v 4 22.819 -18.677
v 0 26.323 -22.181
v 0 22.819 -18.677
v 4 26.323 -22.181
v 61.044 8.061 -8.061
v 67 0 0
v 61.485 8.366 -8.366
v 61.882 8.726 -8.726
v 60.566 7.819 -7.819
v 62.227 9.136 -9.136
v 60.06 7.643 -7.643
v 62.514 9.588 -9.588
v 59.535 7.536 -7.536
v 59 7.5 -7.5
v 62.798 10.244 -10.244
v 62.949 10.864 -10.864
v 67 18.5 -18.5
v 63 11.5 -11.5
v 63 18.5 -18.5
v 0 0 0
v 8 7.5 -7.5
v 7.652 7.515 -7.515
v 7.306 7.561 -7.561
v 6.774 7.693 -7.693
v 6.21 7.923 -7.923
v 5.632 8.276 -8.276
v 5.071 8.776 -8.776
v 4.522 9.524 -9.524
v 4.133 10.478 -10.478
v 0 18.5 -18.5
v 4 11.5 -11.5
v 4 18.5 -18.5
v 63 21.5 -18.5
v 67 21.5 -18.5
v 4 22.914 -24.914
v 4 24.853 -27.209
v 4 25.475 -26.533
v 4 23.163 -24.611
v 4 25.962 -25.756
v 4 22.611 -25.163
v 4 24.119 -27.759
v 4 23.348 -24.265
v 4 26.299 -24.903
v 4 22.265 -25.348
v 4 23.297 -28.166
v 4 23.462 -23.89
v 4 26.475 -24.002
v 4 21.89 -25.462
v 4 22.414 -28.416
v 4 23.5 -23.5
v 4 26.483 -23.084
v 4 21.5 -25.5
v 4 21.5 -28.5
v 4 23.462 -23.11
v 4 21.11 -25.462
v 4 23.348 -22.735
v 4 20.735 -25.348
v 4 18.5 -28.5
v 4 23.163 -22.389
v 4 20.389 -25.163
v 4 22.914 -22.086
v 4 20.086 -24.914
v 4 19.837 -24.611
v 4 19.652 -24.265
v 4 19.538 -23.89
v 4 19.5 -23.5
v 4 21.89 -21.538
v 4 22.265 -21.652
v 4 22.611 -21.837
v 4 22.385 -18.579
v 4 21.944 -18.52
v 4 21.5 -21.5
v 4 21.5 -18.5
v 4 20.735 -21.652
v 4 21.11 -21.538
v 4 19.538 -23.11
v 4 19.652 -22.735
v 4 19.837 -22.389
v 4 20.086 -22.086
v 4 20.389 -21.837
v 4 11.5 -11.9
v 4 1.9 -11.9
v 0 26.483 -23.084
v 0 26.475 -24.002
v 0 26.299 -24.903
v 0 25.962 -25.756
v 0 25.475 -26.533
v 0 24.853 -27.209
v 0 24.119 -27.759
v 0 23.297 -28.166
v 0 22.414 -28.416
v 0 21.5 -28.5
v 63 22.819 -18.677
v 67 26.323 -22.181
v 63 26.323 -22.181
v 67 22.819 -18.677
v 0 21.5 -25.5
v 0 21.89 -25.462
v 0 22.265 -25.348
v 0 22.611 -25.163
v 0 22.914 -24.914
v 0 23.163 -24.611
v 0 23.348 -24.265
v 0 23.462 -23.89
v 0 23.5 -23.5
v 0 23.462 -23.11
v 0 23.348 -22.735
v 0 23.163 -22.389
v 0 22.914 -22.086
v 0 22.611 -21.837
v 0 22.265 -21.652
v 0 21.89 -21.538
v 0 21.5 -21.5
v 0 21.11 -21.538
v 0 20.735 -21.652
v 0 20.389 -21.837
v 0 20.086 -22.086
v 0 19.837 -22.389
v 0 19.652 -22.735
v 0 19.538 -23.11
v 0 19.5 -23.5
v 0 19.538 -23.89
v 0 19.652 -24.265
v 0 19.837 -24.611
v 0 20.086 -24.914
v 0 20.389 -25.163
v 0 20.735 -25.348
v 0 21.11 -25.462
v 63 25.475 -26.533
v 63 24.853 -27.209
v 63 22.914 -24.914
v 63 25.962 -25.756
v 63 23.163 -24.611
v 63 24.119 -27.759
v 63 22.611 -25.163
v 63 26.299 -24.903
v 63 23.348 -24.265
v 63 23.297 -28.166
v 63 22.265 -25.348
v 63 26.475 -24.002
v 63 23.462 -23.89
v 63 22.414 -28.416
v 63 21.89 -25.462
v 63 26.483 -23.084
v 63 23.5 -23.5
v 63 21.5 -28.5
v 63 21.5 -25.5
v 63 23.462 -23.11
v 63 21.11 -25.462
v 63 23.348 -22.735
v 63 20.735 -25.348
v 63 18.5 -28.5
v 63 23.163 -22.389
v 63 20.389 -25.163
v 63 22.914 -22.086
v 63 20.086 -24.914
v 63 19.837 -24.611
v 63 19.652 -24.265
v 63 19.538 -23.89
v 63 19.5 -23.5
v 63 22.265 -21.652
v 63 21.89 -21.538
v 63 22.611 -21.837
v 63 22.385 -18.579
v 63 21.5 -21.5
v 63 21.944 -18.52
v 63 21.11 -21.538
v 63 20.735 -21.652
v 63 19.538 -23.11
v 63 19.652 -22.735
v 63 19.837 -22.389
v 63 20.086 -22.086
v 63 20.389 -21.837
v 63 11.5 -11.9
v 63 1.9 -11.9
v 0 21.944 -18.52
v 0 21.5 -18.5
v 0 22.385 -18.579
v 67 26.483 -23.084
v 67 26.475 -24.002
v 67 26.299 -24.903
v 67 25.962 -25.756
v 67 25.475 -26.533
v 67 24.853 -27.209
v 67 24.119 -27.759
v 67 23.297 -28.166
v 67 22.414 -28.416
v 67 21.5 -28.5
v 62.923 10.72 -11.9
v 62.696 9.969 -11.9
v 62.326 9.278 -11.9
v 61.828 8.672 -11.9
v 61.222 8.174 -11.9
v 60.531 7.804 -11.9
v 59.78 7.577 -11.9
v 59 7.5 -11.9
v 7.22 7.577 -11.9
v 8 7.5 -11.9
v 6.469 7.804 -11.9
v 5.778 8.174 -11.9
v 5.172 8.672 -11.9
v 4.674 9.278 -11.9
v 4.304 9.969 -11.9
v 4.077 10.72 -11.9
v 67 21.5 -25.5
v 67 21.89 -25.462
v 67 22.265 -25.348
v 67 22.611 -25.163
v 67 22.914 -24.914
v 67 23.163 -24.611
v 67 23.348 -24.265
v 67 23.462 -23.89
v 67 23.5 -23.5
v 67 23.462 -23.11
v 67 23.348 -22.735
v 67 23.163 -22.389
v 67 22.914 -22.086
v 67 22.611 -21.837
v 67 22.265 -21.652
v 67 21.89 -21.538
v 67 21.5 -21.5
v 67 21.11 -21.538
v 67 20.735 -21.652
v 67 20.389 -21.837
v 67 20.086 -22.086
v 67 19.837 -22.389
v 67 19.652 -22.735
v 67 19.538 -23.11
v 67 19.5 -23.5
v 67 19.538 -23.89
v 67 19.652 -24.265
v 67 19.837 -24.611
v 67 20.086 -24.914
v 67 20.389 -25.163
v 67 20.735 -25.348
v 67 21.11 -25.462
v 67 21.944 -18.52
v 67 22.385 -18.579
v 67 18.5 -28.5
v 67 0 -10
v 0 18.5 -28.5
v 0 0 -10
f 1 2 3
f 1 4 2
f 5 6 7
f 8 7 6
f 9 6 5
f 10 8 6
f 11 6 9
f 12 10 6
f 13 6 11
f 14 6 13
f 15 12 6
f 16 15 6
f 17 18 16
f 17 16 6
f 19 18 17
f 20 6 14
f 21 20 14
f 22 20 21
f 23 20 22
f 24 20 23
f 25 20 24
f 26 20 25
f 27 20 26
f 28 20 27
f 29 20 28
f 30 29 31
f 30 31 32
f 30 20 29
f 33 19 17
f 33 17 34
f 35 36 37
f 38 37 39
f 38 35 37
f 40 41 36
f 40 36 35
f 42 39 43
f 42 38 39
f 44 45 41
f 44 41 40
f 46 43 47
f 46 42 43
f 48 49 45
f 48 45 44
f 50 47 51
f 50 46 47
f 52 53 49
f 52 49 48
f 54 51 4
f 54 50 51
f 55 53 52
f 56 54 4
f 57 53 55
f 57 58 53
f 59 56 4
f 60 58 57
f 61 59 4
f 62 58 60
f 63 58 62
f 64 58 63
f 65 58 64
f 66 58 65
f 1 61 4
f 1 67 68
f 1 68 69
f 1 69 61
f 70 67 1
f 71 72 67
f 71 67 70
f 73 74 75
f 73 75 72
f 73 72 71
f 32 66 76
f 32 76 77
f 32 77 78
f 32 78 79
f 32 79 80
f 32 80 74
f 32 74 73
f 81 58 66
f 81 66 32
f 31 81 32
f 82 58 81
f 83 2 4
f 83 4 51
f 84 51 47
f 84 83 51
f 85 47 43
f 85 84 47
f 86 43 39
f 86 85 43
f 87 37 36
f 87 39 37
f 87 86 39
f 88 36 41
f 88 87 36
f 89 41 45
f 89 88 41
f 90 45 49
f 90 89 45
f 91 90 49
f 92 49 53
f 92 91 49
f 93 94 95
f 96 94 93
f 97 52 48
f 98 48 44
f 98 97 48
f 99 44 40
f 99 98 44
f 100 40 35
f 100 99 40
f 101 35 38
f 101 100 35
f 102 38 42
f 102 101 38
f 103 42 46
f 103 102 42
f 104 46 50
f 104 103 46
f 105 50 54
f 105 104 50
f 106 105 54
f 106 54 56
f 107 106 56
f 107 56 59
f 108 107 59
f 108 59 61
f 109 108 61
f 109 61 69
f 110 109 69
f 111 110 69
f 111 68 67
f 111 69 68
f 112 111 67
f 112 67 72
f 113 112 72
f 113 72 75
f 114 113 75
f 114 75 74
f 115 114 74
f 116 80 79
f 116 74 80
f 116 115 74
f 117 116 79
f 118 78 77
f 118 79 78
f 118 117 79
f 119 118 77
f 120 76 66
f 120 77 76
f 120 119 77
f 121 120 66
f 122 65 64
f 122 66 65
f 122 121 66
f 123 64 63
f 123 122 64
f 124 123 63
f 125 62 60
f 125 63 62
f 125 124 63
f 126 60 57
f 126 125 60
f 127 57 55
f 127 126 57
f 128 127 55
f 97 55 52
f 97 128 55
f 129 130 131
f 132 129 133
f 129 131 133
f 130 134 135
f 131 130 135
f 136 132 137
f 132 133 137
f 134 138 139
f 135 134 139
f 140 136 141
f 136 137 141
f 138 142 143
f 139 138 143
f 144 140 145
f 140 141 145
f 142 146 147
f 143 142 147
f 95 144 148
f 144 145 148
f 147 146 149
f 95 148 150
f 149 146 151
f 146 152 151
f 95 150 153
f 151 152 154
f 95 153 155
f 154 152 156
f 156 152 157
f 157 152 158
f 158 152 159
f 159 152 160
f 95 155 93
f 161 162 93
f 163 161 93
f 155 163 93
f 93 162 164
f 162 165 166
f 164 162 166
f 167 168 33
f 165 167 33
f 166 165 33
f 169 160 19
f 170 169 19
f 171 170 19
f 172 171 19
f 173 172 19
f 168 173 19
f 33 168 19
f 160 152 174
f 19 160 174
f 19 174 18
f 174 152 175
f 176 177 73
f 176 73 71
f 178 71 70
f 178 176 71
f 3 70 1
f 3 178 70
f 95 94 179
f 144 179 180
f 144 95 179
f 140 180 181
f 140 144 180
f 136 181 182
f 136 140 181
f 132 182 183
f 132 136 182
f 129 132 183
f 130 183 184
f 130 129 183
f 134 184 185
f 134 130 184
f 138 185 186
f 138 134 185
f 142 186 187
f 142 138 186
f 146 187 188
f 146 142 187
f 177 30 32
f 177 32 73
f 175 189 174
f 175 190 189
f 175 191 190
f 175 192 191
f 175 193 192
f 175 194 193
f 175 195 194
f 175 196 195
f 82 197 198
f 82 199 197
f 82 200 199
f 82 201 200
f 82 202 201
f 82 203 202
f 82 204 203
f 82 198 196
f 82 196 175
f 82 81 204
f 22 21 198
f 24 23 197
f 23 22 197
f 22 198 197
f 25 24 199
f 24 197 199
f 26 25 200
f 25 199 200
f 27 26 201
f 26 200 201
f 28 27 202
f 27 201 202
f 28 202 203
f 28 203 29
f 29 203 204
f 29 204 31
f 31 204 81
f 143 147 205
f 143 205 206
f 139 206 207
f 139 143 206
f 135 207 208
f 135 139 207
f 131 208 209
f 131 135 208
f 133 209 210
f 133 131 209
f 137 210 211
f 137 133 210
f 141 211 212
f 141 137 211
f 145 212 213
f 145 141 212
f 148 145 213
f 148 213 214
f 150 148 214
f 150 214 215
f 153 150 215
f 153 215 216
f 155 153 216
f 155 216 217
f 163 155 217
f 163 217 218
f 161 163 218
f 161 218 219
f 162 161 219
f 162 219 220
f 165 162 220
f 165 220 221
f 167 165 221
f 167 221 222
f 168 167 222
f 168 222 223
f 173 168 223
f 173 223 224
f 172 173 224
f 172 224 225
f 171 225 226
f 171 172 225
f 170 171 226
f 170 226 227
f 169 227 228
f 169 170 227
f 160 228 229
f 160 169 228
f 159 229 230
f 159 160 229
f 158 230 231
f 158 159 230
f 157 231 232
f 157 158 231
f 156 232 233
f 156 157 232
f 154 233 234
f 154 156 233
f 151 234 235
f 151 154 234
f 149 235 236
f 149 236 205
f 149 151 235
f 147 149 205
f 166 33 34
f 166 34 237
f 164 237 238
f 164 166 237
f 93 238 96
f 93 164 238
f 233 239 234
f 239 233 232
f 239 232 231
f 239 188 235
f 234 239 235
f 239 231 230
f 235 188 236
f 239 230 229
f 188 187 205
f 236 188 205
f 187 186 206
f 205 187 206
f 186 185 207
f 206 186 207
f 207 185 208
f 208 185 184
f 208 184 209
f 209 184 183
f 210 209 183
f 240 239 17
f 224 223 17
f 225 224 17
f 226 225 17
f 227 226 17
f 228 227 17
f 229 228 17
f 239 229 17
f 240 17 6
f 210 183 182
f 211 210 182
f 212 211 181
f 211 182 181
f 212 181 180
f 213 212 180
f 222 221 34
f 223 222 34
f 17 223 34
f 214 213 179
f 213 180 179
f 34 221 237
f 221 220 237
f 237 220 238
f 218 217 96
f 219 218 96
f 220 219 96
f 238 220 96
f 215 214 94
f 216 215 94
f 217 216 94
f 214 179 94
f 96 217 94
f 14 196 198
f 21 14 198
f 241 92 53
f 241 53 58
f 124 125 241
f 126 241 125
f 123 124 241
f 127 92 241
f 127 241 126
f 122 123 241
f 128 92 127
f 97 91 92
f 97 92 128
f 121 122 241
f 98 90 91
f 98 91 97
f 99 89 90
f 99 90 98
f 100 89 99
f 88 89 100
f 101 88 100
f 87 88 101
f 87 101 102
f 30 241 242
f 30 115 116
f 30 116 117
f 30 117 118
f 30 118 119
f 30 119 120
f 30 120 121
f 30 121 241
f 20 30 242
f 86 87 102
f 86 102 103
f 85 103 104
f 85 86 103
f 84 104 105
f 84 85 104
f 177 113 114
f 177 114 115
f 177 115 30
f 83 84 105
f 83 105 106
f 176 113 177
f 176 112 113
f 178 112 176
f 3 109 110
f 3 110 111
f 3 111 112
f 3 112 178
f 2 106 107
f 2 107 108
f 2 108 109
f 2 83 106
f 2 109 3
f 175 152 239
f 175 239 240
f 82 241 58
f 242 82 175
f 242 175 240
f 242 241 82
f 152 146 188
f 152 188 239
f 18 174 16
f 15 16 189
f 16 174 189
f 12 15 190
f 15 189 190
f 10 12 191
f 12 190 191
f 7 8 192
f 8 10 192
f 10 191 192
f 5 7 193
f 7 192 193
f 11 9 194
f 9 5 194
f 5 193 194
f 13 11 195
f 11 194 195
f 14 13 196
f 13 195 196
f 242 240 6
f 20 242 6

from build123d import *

# Parameters (mm, degrees)
SKETCH1_R           = 2
BOSS_EXTRUDE1_DEPTH = 67
CUT_EXTRUDE1_REACH  = 30.5
CUT_EXTRUDE2_REACH  = 28.5
SKETCH3_W           = 59
SKETCH3_H           = 9.6
SKETCH4_OUTSIDE_W   = 45.996
SKETCH4_OUTSIDE_H   = 43.996
CUT_EXTRUDE3_DEPTH  = 68


with BuildPart() as part:
    # Sketch1 → Boss-Extrude1 (new body)
    with BuildSketch(Plane(origin=(0, 0, 0), x_dir=(0, 0, -1), z_dir=(1, 0, 0))):
        with BuildLine():
            Line((11.9, 1.9), (11.9, 0))
            Line((11.9, 0), (0, 0))
            Line((0, 0), (18.5, 18.5))
            Line((18.5, 18.5), (18.5, 21.5))
            ThreePointArc((18.5, 21.5), (23.5, 26.5), (28.5, 21.5))
            Line((28.5, 21.5), (28.5, 18.5))
            Line((28.5, 18.5), (11.9, 1.9))
        make_face()
        with Locations((23.5, 21.5)):
            Circle(SKETCH1_R, mode=Mode.SUBTRACT)
    extrude(amount=BOSS_EXTRUDE1_DEPTH)

    # Sketch2 → Cut-Extrude1 (cut, up to next)
    with BuildSketch(Plane(origin=(0, 0, -28.5), x_dir=(-1, 0, 0), z_dir=(0, 0, -1)), mode=Mode.PRIVATE) as cut_extrude1_sk1:
        with BuildLine():
            Line((-63, 26.5), (-63, 11.5))
            ThreePointArc((-63, 11.5), (-61.828427125, 8.671572875), (-59, 7.5))
            Line((-59, 7.5), (-8, 7.5))
            ThreePointArc((-8, 7.5), (-5.171572875, 8.671572875), (-4, 11.5))
            Line((-4, 11.5), (-4, 26.5))
            Line((-4, 26.5), (-63, 26.5))
        make_face()
    cut_extrude1_tool1 = extrude(cut_extrude1_sk1.sketch, amount=-CUT_EXTRUDE1_REACH, mode=Mode.PRIVATE) & part.part
    add(cut_extrude1_tool1.solids().sort_by_distance((33.5, 17.053049, -28.5))[0], mode=Mode.SUBTRACT)

    # Sketch3 → Cut-Extrude2 (cut, up to next)
    with BuildSketch(Plane.XZ, mode=Mode.PRIVATE) as cut_extrude2_sk1:
        with Locations((33.5, -16.7)):
            Rectangle(SKETCH3_W, SKETCH3_H)
    cut_extrude2_tool1 = extrude(cut_extrude2_sk1.sketch, amount=-CUT_EXTRUDE2_REACH, mode=Mode.PRIVATE) & part.part
    add(cut_extrude2_tool1.solids().sort_by_distance((33.5, 0, -16.7))[0], mode=Mode.SUBTRACT)

    # Sketch4 outside → Cut-Extrude3 (cut, through all)
    with BuildSketch(Plane(origin=(67, 0, 0), x_dir=(0, 0, -1), z_dir=(1, 0, 0))):
        with Locations((14.25, 13.25)):
            Rectangle(SKETCH4_OUTSIDE_W, SKETCH4_OUTSIDE_H)
        Polygon((26.396638245, 30.538773869), (-4.319805153, -0.17766953), (2.751262658, -7.248737342), (33.467706057, 23.467706057), align=None, mode=Mode.SUBTRACT)
    extrude(amount=-CUT_EXTRUDE3_DEPTH, mode=Mode.SUBTRACT)


solid = part.part
